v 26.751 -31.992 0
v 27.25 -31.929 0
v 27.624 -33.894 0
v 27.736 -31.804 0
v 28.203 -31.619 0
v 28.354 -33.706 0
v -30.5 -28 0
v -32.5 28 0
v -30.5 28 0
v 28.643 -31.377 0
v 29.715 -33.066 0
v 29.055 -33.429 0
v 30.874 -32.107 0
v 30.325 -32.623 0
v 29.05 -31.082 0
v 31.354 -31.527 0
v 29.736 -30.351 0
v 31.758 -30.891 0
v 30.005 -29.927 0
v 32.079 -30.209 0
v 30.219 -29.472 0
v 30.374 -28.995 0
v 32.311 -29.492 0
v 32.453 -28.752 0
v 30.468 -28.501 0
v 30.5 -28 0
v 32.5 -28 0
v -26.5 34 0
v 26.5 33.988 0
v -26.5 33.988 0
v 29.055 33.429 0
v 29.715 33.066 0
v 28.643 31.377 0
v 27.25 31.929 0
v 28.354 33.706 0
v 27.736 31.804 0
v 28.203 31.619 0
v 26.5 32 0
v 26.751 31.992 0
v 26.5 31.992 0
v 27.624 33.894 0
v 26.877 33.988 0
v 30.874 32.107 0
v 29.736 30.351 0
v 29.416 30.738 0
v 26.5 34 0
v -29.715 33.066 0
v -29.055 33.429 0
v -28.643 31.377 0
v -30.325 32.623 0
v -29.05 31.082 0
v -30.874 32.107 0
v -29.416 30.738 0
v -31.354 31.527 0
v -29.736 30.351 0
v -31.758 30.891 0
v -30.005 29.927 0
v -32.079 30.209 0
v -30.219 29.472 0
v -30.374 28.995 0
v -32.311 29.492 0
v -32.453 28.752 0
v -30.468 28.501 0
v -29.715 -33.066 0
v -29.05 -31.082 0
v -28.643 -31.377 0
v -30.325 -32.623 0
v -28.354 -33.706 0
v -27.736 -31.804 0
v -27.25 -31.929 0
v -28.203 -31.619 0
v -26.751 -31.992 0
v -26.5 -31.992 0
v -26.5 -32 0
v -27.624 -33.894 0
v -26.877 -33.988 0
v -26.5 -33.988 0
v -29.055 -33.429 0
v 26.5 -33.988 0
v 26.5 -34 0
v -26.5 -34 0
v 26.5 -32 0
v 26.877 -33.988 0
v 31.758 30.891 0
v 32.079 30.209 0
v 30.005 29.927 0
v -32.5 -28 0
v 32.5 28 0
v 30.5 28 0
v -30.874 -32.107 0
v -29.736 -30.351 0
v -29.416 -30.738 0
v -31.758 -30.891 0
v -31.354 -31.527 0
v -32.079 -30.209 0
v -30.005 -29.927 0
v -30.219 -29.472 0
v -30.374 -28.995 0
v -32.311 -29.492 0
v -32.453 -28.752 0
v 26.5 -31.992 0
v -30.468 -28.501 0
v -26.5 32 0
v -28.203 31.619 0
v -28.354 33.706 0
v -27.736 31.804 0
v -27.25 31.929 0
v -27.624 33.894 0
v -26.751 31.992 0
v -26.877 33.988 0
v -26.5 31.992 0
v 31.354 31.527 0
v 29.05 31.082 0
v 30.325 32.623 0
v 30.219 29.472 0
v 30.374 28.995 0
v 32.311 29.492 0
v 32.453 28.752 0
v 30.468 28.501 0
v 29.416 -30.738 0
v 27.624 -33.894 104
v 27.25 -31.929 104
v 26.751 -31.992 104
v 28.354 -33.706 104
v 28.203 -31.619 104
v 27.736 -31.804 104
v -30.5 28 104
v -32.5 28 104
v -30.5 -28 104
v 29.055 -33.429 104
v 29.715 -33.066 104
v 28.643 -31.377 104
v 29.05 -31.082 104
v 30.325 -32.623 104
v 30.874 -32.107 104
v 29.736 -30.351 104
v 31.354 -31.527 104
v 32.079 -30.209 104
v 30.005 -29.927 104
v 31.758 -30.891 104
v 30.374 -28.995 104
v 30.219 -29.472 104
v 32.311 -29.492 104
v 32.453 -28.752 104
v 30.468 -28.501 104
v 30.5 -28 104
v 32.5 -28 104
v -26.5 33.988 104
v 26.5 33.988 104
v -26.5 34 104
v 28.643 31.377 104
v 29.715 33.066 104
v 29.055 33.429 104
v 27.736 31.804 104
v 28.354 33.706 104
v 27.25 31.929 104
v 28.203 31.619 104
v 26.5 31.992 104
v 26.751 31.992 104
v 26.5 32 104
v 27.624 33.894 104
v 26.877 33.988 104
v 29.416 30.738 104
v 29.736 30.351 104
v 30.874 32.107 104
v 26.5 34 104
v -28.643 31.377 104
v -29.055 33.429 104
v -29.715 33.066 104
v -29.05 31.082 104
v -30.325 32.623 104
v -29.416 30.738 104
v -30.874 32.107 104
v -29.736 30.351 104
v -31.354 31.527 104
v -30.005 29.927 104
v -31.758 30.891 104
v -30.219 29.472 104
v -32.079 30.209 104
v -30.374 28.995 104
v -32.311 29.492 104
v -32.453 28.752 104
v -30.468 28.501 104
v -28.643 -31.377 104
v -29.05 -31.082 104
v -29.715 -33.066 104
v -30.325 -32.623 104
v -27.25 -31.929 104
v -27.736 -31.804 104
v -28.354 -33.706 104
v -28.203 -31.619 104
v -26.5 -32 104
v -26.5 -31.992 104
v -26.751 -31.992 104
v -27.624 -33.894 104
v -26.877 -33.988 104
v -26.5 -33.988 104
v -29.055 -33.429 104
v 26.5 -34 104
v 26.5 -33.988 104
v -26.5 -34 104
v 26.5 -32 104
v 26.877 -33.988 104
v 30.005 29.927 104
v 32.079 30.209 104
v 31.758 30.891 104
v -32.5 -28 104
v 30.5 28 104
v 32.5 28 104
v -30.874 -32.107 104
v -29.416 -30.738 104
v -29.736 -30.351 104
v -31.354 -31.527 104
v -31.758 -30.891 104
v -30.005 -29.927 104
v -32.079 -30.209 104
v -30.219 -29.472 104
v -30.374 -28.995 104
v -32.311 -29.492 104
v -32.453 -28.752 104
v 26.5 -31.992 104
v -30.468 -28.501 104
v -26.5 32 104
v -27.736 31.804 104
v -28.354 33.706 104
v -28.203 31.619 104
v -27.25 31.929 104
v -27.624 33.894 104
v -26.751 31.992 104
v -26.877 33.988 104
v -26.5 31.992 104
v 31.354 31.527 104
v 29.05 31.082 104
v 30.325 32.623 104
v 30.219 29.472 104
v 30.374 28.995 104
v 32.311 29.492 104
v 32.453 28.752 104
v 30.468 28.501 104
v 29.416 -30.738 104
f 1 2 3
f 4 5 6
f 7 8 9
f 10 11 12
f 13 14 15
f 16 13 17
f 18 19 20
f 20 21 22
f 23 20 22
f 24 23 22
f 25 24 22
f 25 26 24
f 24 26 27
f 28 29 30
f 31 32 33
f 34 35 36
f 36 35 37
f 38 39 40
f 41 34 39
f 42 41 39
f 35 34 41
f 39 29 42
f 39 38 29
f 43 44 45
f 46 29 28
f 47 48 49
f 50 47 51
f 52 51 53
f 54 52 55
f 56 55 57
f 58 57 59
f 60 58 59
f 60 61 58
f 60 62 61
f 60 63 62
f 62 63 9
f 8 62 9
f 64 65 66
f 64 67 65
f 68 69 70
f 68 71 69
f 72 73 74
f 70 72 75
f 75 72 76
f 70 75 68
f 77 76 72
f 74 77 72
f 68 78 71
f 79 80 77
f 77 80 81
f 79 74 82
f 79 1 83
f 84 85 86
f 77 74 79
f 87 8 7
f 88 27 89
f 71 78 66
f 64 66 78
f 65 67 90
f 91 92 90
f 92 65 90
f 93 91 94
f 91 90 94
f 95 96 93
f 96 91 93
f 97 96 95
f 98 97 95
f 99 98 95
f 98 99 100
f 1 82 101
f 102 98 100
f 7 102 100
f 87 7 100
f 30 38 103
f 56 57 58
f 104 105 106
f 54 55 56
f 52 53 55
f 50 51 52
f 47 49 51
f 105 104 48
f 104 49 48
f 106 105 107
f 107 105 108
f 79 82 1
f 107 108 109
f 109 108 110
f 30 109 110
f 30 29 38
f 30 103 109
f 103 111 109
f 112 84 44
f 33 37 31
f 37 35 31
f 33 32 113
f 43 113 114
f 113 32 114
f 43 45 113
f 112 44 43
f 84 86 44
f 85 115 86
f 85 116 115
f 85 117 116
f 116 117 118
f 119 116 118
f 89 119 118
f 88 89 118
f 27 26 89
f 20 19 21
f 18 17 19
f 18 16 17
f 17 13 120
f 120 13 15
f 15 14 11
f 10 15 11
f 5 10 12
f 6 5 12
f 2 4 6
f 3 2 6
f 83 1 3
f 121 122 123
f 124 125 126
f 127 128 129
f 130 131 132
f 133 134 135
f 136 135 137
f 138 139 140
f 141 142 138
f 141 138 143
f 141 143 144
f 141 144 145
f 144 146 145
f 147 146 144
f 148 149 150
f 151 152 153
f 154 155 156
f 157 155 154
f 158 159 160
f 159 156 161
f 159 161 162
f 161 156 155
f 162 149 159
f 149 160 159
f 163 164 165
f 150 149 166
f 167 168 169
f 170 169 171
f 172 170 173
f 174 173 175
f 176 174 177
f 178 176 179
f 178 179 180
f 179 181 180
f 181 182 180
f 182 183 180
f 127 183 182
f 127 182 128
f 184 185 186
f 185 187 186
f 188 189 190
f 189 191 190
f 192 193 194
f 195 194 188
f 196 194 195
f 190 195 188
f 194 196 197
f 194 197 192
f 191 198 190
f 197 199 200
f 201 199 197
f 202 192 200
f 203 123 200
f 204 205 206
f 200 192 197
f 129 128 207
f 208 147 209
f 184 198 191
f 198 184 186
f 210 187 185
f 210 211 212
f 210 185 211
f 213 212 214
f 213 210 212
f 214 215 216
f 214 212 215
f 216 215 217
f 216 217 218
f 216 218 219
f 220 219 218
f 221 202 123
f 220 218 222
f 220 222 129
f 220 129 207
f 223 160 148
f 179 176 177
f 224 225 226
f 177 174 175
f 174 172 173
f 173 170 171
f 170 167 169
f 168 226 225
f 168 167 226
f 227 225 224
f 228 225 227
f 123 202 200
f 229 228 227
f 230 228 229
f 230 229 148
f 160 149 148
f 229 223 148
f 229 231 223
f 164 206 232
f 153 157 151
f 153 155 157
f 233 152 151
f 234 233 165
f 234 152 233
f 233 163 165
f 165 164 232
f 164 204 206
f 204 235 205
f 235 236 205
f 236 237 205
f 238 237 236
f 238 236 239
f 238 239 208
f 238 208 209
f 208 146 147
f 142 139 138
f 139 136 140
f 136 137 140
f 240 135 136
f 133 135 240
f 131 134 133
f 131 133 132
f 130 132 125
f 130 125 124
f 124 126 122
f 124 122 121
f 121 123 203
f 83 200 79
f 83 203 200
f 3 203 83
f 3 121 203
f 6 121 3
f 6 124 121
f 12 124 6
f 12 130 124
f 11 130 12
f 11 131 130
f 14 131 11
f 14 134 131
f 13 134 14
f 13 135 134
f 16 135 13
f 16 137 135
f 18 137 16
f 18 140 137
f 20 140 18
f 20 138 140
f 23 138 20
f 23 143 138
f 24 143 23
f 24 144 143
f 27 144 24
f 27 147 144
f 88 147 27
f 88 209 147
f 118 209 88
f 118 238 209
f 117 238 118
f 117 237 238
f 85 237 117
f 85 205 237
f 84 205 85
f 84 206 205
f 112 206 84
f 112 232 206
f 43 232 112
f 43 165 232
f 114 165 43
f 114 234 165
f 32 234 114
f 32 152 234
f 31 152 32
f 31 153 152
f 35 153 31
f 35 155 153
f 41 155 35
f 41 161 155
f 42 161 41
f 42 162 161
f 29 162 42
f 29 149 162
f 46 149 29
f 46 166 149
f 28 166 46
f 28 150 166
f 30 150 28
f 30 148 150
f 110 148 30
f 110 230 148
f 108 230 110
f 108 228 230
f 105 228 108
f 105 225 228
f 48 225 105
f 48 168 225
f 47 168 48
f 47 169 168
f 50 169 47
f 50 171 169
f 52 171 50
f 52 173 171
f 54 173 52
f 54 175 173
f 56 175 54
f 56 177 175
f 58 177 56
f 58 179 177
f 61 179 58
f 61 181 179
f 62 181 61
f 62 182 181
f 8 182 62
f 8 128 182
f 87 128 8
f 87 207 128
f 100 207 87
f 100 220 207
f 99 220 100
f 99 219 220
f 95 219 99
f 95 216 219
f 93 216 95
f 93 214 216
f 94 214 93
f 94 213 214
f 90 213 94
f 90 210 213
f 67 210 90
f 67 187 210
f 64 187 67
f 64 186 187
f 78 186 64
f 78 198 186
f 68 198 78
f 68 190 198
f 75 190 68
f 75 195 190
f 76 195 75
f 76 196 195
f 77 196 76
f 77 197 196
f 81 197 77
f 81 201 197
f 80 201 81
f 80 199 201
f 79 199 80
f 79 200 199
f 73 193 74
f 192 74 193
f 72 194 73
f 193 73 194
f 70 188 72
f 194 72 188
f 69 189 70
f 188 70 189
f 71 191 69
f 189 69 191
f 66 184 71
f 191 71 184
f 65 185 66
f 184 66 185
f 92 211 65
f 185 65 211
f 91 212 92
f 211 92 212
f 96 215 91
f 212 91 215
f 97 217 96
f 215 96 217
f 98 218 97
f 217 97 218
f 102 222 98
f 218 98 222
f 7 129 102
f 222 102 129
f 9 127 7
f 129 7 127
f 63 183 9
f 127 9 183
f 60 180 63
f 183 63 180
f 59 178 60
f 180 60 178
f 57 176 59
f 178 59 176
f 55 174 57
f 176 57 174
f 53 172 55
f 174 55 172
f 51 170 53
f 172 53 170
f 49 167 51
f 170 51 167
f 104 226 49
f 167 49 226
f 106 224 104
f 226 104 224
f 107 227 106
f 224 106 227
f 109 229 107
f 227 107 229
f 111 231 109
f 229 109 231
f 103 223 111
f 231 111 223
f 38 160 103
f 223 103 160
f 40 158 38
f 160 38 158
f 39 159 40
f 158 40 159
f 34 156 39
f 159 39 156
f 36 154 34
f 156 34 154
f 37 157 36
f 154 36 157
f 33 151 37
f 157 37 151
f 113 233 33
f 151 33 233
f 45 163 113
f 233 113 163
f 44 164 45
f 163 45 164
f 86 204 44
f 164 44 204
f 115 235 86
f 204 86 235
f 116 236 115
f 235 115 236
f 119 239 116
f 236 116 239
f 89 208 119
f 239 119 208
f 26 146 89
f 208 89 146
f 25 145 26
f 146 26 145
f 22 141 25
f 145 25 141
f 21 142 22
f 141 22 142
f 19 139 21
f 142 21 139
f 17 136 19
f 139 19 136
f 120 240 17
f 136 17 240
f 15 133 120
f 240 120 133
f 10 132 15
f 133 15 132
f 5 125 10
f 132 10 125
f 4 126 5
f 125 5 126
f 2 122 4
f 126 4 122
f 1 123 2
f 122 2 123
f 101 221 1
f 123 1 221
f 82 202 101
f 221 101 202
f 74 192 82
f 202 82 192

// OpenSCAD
//height = 104;


module roundedRectangle(w, h, r = 0) {
    
    square([w-2*r, h], true);
    square([w, h-2*r], true);
    
    translate([(w-2*r)/2, (h-2*r)/2, 0])
    circle(r, $fn = 50);
    translate([(w-2*r)/2, -(h-2*r)/2, 0])
    circle(r, $fn = 50);
    translate([-(w-2*r)/2, (h-2*r)/2, 0])
    circle(r, $fn = 50);
    translate([-(w-2*r)/2, -(h-2*r)/2, 0])
    circle(r, $fn = 50);
    }
    

module hollowRoundedRectangle(w, h, r, t) {    
    difference() {
        roundedRectangle(w, h, r);
        roundedRectangle(w-2*t, h-2*t, r-t);
    }
}

module roundedTube(l, w, h, r, t) {
linear_extrude(l, convexity = 20)
hollowRoundedRectangle(w, h, r, t);
}

color([1, 0, 0, 1])
roundedTube(104, 65, 68, 6, 2);

/*difference() {
translate([0, (68 - 8)/2, 0])
linear_extrude(2)
square([65, 8], center = true);
translate([0,0,-1])
roundedTube(height + 2, 75, 78, 11, 5);
color("blue")
translate([10, 34 - 4, -1])
cylinder(4, 1.5, 1.5, $fn=50);
color("blue")
translate([-10, 34 - 4, -1])
cylinder(4, 1.5, 1.5, $fn=50);
        
}*/

// To extract
//inside
//roundedTube(height + 2, 71, 74, 9, 5);
//outside
//roundedTube(height + 2, 75, 78, 11, 5);
